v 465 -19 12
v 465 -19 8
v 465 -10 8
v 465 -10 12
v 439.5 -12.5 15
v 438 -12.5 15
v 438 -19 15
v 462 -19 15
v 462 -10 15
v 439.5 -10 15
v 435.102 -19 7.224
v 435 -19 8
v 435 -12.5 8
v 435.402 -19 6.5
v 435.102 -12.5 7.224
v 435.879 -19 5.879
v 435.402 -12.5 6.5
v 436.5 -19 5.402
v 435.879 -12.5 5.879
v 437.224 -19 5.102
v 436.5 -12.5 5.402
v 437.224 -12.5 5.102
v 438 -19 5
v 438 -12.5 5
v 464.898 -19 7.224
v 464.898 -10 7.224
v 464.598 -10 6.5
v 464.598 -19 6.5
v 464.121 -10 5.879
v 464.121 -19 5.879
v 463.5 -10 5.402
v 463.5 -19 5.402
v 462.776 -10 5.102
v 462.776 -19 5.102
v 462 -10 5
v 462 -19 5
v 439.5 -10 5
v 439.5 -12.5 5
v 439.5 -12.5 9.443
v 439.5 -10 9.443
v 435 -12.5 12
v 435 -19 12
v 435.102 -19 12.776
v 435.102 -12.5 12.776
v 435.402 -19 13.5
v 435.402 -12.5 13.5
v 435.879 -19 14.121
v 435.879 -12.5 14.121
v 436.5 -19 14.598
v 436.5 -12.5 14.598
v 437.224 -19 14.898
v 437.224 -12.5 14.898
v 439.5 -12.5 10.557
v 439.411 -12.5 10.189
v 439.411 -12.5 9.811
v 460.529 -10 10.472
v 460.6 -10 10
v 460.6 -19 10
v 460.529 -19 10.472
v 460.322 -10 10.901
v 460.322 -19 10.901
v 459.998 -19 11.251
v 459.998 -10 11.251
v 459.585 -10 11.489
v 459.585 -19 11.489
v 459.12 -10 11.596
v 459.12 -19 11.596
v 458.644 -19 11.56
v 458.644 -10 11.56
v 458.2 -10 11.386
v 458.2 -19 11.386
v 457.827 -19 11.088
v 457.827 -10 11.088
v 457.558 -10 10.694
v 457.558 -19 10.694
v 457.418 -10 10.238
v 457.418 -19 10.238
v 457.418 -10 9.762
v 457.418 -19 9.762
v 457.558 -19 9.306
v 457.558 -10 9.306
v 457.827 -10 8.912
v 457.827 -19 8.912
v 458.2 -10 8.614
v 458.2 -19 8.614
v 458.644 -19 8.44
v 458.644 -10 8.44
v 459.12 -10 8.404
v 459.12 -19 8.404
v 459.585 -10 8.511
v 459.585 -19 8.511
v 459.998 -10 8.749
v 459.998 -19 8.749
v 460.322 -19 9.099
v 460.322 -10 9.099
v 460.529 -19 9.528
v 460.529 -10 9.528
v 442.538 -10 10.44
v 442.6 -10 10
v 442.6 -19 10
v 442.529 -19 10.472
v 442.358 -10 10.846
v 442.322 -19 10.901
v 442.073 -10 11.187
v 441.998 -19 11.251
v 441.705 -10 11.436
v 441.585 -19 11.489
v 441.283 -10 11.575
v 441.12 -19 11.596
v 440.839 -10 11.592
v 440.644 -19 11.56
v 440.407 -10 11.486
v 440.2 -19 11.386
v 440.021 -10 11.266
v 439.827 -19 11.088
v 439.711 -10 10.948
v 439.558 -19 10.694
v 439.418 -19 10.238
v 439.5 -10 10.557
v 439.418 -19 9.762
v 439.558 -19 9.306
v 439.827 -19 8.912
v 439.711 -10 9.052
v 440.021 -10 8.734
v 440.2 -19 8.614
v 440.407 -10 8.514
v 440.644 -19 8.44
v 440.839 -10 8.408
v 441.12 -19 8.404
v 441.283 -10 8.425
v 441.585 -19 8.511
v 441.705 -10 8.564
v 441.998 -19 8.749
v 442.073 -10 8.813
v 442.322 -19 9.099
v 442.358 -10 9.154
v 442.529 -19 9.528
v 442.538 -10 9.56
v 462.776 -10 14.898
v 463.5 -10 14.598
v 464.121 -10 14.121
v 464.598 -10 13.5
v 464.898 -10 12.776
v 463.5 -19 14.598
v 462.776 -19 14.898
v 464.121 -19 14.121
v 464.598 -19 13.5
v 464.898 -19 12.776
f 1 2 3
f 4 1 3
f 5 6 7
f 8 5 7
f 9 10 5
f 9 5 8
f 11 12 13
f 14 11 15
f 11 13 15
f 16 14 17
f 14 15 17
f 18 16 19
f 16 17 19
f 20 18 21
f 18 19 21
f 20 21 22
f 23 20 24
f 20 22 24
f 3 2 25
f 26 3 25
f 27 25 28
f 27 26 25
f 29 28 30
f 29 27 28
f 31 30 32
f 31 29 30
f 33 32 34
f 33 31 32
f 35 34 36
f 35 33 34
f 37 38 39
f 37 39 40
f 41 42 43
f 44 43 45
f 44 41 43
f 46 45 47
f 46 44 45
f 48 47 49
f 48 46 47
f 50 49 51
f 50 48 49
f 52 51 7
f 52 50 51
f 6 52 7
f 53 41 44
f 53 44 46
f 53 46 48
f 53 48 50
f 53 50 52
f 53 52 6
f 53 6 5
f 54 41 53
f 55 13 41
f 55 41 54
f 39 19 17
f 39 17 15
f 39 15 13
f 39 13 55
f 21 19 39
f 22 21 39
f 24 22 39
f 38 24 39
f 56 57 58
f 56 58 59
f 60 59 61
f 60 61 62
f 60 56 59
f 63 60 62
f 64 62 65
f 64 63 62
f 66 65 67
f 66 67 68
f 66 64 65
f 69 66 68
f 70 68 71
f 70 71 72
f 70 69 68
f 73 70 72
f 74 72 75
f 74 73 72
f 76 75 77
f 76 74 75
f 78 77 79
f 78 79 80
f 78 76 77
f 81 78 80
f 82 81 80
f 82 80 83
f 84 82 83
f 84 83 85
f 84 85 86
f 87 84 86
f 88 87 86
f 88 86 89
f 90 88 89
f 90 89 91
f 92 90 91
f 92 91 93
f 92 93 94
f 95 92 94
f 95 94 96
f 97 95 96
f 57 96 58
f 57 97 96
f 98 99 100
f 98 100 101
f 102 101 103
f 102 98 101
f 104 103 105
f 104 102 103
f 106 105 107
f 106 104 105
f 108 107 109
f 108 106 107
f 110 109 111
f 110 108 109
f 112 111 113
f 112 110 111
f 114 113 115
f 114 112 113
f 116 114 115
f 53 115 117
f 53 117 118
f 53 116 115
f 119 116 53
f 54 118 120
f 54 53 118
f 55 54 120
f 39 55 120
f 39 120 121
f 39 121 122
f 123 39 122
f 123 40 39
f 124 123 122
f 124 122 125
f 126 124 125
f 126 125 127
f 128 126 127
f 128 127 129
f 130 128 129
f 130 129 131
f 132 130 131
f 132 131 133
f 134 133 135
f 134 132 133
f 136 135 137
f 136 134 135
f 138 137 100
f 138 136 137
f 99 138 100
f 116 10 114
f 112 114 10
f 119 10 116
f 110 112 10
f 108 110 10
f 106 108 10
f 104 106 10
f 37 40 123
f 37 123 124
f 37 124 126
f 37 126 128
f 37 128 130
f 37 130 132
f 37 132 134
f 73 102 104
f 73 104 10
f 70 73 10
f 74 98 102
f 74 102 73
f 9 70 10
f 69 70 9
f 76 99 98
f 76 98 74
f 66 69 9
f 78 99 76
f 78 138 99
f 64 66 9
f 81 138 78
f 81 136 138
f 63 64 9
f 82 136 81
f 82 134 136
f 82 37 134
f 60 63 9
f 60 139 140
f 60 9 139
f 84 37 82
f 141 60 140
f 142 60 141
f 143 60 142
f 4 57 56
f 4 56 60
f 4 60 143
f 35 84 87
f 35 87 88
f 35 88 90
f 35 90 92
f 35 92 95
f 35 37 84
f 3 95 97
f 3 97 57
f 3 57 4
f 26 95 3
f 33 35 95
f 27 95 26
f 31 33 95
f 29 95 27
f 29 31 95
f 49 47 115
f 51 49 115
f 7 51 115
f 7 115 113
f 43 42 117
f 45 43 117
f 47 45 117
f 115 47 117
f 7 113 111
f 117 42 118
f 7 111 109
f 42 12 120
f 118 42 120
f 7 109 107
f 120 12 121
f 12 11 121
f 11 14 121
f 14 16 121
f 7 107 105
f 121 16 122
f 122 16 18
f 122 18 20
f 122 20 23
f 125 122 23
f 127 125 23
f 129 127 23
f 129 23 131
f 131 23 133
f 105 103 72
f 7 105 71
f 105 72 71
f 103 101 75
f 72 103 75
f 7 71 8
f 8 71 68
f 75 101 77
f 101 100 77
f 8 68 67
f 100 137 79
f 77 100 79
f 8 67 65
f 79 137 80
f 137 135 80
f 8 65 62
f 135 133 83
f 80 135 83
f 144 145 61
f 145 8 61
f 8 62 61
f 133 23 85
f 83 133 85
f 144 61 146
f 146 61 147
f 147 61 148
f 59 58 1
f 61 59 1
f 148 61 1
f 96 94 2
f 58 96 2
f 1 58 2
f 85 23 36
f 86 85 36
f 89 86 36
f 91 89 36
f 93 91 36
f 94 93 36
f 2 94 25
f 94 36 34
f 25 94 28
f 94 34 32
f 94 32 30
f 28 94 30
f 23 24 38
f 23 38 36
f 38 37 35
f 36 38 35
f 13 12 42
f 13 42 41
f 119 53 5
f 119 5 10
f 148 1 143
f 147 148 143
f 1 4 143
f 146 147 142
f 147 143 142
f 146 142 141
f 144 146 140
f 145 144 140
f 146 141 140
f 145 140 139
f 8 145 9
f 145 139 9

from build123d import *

# Parameters (mm, degrees)
BOX323_W          = 10
BOX323_H          = 2.5
BOX323_DEPTH      = 10
CYLINDER152_R     = 1.6
CYLINDER152_DEPTH = 9
CYLINDER153_R     = 1.6
CYLINDER153_DEPTH = 9
CYLINDER154_R     = 1.6
CYLINDER154_DEPTH = 9
CYLINDER155_R     = 1.6
CYLINDER155_DEPTH = 9
BOX071_W          = 30
BOX071_H          = 9
BOX071_DEPTH      = 10
FILLET034_R       = 3


with BuildPart() as cube394:
    # Box323 → Box323 (new body)
    with BuildSketch(Plane(origin=(429.5, -12.5, 5), x_dir=(1, 0, 0), z_dir=(0, 0, 1))):
        with Locations((5, 1.25)):
            Rectangle(BOX323_W, BOX323_H)
    extrude(amount=BOX323_DEPTH)


with BuildPart() as cylinder152:
    # Cylinder152 → Cylinder152 (new body)
    with BuildSketch(Plane(origin=(555, -5, 10), x_dir=(1, 0, 0), z_dir=(0, -1, 0))):
        Circle(CYLINDER152_R)
    extrude(amount=CYLINDER152_DEPTH)


with BuildPart() as fusion125:
    # Cylinder153 → Cylinder153 (new body)
    with BuildSketch(Plane(origin=(450, -5, 10), x_dir=(1, 0, 0), z_dir=(0, -1, 0))):
        Circle(CYLINDER153_R)
    extrude(amount=CYLINDER153_DEPTH)

    # Fusion125: union Cylinder152
    add(cylinder152.part)


with BuildPart() as fusion125_1:
    # Fusion125 placement: moved
    add(fusion125.part.moved(Location((-9, 5, 0))))


with BuildPart() as cylinder154:
    # Cylinder154 → Cylinder154 (new body)
    with BuildSketch(Plane(origin=(555, -5, 10), x_dir=(1, 0, 0), z_dir=(0, -1, 0))):
        Circle(CYLINDER154_R)
    extrude(amount=CYLINDER154_DEPTH)


with BuildPart() as fusion135:
    # Cylinder155 → Cylinder155 (new body)
    with BuildSketch(Plane(origin=(450, -5, 10), x_dir=(1, 0, 0), z_dir=(0, -1, 0))):
        Circle(CYLINDER155_R)
    extrude(amount=CYLINDER155_DEPTH)

    # Fusion132: union Cylinder154
    add(cylinder154.part)


with BuildPart() as fusion135_1:
    # Fusion132 placement: moved
    add(fusion135.part.moved(Location((9, 5, 0))))

    # Fusion135: union Fusion125
    add(fusion125_1.part)


with BuildPart() as fender_spacer_front_left:
    # Box071 → Box071 (new body)
    with BuildSketch(Plane(origin=(435, -9, 5), x_dir=(1, 0, 0), z_dir=(0, 0, 1))):
        with Locations((15, 4.5)):
            Rectangle(BOX071_W, BOX071_H)
    extrude(amount=BOX071_DEPTH)

    # Fillet034
    fillet034_edges = [fender_spacer_front_left.edges().sort_by_distance(p)[0] for p in [
        (435, -4.5, 15),
        (435, -4.5, 5),
        (465, -4.5, 15),
        (465, -4.5, 5),
    ]]
    fillet(fillet034_edges, radius=FILLET034_R)

    # Cut083: cut Fusion135
    add(fusion135_1.part, mode=Mode.SUBTRACT)


with BuildPart() as fender_spacer_front_left_1:
    # Cut083 placement: moved
    add(fender_spacer_front_left.part.moved(Location((0, -10, 0))))

    # Cut322: cut Cube394
    add(cube394.part, mode=Mode.SUBTRACT)


solid = fender_spacer_front_left_1.part
